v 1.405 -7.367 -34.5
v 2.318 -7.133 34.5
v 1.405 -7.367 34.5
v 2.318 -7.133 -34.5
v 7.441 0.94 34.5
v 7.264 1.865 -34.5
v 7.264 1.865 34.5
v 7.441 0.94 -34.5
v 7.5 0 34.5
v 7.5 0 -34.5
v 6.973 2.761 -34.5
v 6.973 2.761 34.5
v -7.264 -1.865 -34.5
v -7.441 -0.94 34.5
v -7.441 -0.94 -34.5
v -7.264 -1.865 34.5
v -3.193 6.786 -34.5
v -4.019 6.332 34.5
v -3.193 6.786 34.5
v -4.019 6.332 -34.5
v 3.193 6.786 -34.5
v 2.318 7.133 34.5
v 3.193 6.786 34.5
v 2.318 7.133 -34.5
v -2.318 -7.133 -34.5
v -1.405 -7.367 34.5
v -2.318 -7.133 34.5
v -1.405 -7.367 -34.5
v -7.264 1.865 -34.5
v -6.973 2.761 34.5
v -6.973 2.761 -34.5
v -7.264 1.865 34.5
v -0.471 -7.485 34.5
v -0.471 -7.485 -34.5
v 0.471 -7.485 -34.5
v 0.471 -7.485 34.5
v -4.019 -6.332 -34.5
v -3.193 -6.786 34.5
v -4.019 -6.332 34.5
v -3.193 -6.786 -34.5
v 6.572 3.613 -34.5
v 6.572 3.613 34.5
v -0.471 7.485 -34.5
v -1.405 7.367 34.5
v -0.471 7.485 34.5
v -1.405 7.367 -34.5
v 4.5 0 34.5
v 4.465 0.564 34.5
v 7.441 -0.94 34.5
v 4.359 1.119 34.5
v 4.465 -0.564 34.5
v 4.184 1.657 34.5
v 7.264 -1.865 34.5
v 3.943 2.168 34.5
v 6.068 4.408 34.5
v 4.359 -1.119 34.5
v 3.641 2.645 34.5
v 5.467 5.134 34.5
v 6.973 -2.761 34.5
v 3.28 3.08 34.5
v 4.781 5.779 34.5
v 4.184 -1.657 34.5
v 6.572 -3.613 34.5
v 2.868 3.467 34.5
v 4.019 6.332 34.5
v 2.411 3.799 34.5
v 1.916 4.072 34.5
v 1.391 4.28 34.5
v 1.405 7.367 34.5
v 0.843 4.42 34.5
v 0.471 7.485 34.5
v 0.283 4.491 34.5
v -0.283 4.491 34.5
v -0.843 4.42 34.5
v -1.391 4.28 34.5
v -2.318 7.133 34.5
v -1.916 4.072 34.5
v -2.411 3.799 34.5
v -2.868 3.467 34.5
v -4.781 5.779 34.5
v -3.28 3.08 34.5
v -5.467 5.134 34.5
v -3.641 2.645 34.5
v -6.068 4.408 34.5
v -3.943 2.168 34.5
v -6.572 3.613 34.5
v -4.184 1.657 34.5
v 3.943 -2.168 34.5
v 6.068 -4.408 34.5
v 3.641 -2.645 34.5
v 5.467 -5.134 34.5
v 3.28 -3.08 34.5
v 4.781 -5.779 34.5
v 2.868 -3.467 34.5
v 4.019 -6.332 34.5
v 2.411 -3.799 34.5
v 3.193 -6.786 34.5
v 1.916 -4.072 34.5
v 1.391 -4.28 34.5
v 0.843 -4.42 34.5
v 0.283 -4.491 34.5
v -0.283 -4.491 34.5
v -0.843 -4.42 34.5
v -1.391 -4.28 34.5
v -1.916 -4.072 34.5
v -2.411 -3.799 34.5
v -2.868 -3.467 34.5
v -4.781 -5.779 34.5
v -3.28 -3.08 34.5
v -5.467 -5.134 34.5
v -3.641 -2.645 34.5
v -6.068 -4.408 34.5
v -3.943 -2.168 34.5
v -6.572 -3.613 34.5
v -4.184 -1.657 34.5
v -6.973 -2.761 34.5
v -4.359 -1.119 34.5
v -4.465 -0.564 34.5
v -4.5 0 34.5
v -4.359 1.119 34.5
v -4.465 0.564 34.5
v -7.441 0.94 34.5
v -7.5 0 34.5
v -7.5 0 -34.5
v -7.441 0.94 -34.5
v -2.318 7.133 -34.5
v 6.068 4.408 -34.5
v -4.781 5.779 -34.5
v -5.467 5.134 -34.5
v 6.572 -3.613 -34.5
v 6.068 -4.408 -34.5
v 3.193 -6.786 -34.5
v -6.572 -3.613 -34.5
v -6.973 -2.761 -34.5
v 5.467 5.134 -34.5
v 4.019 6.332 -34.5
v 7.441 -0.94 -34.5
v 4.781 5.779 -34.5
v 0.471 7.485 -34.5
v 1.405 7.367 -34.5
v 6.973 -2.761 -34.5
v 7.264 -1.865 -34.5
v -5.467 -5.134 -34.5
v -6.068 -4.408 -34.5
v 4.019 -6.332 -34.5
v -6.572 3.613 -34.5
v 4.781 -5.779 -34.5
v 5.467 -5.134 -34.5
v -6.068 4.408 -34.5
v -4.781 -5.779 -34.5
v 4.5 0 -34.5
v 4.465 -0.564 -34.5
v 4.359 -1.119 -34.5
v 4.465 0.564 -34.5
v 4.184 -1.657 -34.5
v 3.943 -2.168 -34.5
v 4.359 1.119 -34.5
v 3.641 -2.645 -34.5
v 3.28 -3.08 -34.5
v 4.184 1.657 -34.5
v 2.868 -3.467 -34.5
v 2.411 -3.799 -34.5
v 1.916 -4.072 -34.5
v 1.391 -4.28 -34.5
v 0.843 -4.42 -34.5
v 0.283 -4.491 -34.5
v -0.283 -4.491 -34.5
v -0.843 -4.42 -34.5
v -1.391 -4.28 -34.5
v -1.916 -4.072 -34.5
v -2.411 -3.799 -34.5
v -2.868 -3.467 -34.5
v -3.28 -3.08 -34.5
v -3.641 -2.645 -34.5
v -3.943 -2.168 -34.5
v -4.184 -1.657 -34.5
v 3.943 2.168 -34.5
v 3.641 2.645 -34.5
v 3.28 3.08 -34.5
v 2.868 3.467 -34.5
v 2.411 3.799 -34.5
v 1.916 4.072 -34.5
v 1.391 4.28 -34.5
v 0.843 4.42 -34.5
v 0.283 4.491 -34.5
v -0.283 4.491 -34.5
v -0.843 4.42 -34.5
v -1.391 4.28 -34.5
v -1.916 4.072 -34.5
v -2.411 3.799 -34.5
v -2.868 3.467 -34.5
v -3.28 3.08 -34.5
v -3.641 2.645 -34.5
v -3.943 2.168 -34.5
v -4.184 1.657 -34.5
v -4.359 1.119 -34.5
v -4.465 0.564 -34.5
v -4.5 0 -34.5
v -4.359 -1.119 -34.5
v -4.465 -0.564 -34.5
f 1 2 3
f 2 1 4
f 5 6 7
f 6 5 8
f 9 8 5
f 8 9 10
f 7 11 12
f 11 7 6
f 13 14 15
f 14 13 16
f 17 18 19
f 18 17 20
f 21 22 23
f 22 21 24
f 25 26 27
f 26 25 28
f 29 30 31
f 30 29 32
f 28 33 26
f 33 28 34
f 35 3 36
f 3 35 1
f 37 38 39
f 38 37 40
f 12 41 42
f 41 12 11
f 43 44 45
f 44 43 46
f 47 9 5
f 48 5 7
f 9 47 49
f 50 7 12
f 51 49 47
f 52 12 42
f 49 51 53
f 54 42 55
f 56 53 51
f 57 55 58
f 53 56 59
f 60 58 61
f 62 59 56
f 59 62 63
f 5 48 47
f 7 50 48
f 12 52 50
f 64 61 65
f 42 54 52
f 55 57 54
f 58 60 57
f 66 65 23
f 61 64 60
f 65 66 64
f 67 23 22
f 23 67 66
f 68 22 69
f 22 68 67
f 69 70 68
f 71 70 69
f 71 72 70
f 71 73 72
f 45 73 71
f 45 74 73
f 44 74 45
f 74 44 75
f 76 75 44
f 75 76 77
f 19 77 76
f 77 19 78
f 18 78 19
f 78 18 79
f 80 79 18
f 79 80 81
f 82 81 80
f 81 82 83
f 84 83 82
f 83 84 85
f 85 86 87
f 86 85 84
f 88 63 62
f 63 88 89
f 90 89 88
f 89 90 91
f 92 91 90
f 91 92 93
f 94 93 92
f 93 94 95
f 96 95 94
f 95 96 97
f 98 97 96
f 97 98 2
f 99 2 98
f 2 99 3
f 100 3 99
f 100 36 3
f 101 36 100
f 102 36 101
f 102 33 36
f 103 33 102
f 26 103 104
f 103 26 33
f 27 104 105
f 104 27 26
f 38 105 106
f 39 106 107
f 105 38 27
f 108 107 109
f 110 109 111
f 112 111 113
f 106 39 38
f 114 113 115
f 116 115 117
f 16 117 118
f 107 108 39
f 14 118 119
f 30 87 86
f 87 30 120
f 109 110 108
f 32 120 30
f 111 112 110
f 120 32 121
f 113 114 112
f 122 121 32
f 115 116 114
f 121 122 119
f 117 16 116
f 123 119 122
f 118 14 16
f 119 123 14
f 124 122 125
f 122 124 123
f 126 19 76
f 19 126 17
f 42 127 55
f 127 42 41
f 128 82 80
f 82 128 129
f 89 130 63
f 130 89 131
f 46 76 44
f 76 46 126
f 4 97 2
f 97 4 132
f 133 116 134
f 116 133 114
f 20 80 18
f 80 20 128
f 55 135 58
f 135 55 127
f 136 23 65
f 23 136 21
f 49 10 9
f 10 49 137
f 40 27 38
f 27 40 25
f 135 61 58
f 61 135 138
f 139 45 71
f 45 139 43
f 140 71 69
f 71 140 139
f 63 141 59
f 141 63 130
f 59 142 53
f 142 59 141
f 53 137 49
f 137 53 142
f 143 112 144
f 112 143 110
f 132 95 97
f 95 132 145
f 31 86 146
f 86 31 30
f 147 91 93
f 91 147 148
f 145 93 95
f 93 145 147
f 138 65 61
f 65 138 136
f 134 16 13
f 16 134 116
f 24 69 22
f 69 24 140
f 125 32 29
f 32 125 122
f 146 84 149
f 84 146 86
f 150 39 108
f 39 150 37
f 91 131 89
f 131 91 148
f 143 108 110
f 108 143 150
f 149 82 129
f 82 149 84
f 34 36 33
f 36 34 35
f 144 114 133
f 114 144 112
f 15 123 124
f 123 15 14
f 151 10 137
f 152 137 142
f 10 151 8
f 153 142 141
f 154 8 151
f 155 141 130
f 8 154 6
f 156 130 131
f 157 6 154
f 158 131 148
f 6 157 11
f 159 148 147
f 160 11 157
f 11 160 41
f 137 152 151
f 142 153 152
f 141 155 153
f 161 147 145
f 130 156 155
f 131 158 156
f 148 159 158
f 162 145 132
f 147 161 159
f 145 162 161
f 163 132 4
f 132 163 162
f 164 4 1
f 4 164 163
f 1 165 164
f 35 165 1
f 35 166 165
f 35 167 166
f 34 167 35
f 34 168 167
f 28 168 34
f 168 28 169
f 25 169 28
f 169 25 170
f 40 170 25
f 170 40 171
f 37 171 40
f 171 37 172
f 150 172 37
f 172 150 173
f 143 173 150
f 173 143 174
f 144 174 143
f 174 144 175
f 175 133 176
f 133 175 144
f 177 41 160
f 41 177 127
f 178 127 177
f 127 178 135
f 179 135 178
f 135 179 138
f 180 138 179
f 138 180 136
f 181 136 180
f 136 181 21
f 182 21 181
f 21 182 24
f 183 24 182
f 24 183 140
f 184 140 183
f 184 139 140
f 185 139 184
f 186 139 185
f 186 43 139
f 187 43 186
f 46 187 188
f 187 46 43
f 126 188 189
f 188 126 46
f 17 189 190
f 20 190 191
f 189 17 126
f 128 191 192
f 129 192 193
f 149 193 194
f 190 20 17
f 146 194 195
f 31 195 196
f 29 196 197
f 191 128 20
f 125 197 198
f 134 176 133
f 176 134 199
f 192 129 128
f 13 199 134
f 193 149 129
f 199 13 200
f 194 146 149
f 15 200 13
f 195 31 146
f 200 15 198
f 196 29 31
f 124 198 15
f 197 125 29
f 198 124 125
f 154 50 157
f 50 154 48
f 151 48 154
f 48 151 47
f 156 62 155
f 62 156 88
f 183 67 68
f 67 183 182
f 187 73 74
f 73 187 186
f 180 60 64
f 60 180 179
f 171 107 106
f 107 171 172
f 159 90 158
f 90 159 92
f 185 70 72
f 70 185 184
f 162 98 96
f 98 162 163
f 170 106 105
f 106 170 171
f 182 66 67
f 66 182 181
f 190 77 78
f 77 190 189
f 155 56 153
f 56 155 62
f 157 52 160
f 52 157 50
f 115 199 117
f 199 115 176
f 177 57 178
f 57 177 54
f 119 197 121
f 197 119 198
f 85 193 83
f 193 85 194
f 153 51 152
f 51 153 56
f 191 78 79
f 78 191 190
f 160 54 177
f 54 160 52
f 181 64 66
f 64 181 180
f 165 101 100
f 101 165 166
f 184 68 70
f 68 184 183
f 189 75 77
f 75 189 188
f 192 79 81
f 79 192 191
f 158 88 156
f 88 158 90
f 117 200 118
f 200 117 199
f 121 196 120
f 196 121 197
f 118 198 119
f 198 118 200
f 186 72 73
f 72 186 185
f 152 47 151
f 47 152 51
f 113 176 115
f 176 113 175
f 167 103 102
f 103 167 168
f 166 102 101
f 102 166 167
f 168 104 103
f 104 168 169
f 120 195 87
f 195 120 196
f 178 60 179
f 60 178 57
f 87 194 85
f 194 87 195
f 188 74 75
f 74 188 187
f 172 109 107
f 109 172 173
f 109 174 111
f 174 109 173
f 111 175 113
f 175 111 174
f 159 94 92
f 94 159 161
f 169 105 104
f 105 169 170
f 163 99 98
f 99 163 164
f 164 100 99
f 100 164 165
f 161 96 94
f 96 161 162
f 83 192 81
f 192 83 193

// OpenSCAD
$fn = 50;


difference() {
	union() {
		translate(v = [0, 0, -34.5000000000]) {
			cylinder(h = 69, r = 7.5000000000);
		}
	}
	union() {
		translate(v = [0, 0, -100.0000000000]) {
			cylinder(h = 200, r = 4.5000000000);
		}
	}
}
